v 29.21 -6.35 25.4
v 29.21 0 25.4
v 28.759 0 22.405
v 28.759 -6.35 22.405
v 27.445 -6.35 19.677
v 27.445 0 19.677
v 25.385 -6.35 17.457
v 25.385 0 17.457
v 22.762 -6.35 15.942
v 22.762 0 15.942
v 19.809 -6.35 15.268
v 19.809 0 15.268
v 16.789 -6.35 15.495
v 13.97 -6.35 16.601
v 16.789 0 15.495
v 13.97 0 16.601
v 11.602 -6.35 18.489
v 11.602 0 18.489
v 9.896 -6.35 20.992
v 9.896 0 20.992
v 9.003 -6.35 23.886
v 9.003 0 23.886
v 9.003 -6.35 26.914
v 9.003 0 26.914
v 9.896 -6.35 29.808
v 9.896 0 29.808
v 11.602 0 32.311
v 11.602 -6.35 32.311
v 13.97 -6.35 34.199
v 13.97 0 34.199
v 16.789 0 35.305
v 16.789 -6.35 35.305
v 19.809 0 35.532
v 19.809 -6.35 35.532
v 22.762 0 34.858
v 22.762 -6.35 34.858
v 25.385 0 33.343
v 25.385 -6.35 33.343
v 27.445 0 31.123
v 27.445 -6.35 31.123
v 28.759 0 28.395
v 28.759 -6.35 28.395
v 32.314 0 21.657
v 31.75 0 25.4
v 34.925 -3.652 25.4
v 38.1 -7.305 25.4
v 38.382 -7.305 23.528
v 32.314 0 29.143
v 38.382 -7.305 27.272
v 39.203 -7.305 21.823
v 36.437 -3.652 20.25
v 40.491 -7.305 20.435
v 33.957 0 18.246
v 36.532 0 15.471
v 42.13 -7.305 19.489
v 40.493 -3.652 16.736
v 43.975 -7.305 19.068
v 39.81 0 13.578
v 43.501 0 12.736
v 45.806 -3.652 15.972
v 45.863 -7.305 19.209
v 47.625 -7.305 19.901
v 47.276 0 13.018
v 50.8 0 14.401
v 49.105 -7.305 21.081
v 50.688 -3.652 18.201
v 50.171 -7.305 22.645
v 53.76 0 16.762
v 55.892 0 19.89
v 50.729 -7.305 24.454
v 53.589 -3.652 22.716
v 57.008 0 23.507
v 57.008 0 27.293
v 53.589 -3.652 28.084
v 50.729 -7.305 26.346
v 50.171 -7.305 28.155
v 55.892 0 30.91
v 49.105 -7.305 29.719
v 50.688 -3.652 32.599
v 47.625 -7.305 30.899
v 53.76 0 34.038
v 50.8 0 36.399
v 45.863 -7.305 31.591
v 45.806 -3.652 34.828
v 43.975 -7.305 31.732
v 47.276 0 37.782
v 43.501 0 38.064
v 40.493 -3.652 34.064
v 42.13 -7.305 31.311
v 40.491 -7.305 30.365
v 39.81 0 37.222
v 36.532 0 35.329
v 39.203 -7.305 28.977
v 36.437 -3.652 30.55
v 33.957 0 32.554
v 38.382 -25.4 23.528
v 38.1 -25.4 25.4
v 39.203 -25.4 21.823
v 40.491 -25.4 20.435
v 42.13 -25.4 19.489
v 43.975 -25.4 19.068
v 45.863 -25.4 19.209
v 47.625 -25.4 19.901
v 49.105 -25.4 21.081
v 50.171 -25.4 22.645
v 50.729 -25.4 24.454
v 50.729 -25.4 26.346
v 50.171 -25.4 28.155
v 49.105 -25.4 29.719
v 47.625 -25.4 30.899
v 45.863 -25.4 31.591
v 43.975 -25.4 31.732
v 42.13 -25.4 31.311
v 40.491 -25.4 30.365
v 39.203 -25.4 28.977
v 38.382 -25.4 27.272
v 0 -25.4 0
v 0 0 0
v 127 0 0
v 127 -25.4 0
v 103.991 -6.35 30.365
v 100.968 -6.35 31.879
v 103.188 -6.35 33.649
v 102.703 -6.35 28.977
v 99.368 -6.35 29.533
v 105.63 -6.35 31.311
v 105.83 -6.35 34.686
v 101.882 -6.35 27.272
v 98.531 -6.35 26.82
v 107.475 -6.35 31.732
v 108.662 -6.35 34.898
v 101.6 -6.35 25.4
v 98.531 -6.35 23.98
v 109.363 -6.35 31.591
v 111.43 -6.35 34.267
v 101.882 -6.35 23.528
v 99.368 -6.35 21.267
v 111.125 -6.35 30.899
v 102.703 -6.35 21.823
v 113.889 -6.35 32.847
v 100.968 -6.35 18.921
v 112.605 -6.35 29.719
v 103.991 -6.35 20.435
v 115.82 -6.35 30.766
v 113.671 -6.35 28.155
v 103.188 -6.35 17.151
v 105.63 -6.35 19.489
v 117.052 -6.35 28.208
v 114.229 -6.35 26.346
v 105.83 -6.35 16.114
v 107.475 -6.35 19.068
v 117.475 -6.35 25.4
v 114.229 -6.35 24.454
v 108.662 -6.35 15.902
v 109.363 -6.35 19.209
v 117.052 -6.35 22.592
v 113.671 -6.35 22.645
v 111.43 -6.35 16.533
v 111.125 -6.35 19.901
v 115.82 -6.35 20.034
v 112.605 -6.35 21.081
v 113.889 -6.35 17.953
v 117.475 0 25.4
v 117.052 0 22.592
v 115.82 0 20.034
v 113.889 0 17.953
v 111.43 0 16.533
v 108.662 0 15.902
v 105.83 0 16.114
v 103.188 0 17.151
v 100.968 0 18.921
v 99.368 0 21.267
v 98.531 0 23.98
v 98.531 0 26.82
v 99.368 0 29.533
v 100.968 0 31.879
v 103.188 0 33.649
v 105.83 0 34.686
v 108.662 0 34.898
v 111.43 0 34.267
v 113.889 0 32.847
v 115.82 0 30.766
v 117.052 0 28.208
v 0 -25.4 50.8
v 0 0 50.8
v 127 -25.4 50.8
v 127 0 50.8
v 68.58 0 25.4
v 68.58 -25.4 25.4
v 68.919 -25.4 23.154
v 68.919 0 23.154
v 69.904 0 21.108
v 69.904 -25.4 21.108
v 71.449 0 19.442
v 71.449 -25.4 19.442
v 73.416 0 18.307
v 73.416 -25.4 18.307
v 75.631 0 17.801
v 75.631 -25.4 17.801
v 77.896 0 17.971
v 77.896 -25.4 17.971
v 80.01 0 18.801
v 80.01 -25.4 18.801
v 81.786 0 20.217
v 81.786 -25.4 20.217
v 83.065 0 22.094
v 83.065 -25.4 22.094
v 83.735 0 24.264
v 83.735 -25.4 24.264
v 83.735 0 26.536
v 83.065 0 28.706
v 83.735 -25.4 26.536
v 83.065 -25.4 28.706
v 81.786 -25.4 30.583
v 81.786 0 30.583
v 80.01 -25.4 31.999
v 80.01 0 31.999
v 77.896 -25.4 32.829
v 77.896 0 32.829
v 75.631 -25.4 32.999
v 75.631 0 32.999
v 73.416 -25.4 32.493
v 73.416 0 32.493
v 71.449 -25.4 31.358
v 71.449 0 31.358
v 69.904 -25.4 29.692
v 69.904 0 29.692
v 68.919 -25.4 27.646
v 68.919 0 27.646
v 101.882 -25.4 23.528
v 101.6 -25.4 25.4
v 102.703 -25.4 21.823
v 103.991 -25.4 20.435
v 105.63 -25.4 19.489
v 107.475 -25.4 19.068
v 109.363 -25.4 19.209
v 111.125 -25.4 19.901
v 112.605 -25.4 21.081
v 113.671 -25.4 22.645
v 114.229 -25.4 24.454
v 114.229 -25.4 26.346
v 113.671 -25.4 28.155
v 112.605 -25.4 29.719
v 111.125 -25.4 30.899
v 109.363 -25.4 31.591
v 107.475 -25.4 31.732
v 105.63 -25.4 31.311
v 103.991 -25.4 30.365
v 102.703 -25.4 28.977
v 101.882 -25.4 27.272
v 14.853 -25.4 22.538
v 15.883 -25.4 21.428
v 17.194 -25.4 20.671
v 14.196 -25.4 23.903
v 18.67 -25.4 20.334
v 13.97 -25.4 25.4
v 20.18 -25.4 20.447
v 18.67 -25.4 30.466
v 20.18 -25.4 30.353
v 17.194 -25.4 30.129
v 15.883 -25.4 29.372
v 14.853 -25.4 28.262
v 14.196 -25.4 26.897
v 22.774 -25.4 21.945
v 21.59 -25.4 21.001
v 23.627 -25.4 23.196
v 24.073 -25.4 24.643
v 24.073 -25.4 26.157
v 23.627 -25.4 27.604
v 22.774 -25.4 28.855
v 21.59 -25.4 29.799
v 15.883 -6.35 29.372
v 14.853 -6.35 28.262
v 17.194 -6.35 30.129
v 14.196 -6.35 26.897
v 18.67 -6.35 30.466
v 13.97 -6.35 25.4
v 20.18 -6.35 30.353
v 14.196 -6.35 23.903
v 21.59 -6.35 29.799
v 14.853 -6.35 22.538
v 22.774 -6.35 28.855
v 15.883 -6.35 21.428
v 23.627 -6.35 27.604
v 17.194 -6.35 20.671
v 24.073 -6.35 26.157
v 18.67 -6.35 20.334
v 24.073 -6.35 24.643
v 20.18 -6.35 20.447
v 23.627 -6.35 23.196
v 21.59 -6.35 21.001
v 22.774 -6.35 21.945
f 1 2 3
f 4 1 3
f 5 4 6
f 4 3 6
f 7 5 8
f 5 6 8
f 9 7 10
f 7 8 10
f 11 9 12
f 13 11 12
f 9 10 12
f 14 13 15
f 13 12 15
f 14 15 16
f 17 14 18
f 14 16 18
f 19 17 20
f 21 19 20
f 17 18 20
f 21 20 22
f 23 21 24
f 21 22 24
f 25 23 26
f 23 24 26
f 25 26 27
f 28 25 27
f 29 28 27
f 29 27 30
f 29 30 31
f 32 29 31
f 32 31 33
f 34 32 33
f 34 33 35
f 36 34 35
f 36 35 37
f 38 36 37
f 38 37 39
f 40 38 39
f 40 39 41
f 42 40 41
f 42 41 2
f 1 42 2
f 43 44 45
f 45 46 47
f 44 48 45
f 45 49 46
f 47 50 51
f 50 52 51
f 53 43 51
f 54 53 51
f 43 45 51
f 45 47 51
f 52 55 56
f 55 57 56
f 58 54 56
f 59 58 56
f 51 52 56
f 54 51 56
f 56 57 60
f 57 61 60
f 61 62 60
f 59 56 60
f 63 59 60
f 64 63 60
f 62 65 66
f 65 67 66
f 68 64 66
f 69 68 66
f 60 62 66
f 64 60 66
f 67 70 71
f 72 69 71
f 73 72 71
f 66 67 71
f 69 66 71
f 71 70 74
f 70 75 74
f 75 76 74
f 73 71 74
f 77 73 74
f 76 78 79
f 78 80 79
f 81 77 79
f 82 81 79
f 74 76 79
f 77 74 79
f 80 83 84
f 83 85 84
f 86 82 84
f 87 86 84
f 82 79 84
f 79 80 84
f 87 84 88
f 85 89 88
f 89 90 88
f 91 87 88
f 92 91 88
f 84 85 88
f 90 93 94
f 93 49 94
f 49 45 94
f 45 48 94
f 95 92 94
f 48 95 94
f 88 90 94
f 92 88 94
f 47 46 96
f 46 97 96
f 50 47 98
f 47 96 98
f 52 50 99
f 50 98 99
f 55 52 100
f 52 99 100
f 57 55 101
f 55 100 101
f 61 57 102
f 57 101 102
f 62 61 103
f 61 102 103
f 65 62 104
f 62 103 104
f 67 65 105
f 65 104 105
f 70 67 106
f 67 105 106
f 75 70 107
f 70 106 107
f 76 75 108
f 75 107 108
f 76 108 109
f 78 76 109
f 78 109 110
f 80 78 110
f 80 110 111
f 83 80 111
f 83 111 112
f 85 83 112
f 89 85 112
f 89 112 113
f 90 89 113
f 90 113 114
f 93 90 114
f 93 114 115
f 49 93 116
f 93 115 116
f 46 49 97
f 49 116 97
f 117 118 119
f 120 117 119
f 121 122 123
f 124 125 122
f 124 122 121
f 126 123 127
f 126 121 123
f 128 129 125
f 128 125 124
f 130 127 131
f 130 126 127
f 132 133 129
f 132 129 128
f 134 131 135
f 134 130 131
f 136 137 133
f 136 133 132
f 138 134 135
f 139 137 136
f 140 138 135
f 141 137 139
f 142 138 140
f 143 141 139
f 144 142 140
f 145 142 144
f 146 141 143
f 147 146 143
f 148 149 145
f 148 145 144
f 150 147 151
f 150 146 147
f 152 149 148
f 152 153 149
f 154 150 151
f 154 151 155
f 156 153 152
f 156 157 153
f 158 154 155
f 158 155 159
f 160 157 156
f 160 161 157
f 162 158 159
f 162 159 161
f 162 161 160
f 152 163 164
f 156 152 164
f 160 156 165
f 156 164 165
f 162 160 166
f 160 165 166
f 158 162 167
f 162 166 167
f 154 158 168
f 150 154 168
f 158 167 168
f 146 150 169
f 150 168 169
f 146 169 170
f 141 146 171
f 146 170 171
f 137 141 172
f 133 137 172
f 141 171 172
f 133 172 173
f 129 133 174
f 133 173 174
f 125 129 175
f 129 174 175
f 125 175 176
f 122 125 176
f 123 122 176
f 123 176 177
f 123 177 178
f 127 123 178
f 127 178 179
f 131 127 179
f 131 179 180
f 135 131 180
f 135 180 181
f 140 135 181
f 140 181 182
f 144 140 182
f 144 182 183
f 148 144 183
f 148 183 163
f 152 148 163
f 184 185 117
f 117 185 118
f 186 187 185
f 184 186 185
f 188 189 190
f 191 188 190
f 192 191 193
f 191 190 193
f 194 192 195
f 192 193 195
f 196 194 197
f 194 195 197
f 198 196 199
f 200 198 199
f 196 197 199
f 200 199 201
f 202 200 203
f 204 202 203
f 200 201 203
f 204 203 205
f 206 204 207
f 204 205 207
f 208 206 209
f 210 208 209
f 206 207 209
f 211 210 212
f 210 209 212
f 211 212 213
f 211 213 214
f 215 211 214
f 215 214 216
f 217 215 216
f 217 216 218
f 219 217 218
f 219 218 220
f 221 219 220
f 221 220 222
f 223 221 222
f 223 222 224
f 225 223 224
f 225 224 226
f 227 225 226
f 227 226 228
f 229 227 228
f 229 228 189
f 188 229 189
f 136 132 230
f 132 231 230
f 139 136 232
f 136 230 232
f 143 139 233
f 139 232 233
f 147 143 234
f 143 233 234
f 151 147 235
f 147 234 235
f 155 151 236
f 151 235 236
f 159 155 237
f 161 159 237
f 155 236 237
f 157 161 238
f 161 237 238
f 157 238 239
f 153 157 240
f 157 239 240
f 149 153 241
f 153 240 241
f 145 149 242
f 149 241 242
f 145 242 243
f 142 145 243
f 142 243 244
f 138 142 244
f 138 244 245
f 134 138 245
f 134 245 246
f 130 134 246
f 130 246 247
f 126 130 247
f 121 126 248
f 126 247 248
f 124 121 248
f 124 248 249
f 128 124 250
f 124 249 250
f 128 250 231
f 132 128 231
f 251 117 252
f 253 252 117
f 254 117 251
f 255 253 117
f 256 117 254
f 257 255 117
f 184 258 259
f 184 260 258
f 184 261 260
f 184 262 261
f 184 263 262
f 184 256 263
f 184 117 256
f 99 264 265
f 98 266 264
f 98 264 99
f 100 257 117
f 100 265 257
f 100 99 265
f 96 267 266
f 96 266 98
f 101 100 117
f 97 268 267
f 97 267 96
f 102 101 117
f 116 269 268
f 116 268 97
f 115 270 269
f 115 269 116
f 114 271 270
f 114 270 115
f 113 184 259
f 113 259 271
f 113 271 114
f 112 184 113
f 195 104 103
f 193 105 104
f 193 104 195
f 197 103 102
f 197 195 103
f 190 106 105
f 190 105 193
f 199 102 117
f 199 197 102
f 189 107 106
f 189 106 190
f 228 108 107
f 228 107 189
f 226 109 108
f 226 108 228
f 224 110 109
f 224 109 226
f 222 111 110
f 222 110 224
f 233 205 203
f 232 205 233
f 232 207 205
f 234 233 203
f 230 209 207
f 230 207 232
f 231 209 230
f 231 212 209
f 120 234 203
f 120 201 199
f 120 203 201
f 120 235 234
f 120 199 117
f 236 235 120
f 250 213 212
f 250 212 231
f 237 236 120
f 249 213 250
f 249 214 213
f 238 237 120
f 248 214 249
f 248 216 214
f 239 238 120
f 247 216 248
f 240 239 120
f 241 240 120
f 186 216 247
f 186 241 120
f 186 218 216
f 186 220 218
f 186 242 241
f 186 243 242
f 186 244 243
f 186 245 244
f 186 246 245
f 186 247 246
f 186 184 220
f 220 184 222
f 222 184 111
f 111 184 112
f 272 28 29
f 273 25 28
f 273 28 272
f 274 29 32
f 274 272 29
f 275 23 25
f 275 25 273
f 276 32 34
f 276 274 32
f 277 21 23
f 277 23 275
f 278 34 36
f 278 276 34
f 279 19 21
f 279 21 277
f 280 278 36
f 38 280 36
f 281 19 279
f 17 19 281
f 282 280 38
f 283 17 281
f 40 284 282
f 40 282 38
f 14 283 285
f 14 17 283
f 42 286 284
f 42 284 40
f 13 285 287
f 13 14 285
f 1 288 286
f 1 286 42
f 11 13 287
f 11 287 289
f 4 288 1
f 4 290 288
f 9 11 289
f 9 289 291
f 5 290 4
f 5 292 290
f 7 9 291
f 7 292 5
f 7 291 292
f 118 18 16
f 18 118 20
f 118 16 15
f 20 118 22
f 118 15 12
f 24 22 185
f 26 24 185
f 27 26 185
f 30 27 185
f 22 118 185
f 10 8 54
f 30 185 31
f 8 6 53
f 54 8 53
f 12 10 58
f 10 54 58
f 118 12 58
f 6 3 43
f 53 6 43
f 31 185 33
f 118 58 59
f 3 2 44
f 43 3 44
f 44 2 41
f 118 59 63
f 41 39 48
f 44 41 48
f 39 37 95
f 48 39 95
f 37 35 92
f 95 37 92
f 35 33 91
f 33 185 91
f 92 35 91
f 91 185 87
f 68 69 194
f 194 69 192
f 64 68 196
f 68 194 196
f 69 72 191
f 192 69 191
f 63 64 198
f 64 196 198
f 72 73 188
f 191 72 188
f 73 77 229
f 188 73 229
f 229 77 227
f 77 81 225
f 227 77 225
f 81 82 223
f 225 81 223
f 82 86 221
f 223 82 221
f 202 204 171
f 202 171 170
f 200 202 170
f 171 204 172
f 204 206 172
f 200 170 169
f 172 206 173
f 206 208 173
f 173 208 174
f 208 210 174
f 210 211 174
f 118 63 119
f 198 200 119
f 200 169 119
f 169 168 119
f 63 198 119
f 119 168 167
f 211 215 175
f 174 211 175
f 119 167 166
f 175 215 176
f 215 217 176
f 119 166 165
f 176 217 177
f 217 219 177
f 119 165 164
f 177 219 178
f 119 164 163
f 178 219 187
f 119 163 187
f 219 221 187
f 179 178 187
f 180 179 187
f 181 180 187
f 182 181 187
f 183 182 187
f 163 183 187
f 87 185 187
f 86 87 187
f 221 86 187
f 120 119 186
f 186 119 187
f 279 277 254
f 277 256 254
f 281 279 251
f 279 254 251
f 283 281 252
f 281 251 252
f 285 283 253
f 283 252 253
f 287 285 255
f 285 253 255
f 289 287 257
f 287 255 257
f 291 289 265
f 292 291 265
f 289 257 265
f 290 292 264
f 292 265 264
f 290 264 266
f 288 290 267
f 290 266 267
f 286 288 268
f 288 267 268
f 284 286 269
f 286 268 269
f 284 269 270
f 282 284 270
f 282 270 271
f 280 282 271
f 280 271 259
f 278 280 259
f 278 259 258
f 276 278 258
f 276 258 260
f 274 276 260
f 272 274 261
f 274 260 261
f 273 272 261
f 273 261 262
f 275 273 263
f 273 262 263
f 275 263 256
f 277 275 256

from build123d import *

# Parameters (mm, degrees)
F1_DEPTH       = 25.4
F2_D           = 12.7
F2_CBORE_D     = 19.05
F2_CBORE_DEPTH = 6.35
F3_D           = 15.24
F4_D           = 12.7
F4_CSINK_D     = 25.4
F4_CSINK_ANGLE = 82
F5_D           = 10.16
F5_CBORE_D     = 20.32
F5_CBORE_DEPTH = 6.35


with BuildPart() as f1:
    # F0 (on Front) → F1 (new body)
    with BuildSketch(Plane.XZ):
        Polygon((0, 25.4), (0, 0), (127, 0), (127, 50.8), (0, 50.8), align=None)
    extrude(amount=F1_DEPTH)

    # F2 (through all)
    with Locations(Plane(origin=(0, 0, 0), x_dir=(1, 0, 0), z_dir=(0, 1, 0))):
        with Locations((107.95, -25.4)):
            CounterBoreHole(F2_D / 2, F2_CBORE_D / 2, F2_CBORE_DEPTH)

    # F3 (through all)
    with Locations(Plane(origin=(0, 0, 0), x_dir=(1, 0, 0), z_dir=(0, 1, 0))):
        with Locations((76.2, -25.4)):
            Hole(F3_D / 2)

    # F4 (through all)
    with Locations(Plane(origin=(0, 0, 0), x_dir=(1, 0, 0), z_dir=(0, 1, 0))):
        with Locations((44.45, -25.4)):
            CounterSinkHole(F4_D / 2, F4_CSINK_D / 2, counter_sink_angle=F4_CSINK_ANGLE)

    # F5 (through all)
    with Locations(Plane(origin=(0, 0, 0), x_dir=(1, 0, 0), z_dir=(0, 1, 0))):
        with Locations((19.05, -25.4)):
            CounterBoreHole(F5_D / 2, F5_CBORE_D / 2, F5_CBORE_DEPTH)


solid = f1.part
